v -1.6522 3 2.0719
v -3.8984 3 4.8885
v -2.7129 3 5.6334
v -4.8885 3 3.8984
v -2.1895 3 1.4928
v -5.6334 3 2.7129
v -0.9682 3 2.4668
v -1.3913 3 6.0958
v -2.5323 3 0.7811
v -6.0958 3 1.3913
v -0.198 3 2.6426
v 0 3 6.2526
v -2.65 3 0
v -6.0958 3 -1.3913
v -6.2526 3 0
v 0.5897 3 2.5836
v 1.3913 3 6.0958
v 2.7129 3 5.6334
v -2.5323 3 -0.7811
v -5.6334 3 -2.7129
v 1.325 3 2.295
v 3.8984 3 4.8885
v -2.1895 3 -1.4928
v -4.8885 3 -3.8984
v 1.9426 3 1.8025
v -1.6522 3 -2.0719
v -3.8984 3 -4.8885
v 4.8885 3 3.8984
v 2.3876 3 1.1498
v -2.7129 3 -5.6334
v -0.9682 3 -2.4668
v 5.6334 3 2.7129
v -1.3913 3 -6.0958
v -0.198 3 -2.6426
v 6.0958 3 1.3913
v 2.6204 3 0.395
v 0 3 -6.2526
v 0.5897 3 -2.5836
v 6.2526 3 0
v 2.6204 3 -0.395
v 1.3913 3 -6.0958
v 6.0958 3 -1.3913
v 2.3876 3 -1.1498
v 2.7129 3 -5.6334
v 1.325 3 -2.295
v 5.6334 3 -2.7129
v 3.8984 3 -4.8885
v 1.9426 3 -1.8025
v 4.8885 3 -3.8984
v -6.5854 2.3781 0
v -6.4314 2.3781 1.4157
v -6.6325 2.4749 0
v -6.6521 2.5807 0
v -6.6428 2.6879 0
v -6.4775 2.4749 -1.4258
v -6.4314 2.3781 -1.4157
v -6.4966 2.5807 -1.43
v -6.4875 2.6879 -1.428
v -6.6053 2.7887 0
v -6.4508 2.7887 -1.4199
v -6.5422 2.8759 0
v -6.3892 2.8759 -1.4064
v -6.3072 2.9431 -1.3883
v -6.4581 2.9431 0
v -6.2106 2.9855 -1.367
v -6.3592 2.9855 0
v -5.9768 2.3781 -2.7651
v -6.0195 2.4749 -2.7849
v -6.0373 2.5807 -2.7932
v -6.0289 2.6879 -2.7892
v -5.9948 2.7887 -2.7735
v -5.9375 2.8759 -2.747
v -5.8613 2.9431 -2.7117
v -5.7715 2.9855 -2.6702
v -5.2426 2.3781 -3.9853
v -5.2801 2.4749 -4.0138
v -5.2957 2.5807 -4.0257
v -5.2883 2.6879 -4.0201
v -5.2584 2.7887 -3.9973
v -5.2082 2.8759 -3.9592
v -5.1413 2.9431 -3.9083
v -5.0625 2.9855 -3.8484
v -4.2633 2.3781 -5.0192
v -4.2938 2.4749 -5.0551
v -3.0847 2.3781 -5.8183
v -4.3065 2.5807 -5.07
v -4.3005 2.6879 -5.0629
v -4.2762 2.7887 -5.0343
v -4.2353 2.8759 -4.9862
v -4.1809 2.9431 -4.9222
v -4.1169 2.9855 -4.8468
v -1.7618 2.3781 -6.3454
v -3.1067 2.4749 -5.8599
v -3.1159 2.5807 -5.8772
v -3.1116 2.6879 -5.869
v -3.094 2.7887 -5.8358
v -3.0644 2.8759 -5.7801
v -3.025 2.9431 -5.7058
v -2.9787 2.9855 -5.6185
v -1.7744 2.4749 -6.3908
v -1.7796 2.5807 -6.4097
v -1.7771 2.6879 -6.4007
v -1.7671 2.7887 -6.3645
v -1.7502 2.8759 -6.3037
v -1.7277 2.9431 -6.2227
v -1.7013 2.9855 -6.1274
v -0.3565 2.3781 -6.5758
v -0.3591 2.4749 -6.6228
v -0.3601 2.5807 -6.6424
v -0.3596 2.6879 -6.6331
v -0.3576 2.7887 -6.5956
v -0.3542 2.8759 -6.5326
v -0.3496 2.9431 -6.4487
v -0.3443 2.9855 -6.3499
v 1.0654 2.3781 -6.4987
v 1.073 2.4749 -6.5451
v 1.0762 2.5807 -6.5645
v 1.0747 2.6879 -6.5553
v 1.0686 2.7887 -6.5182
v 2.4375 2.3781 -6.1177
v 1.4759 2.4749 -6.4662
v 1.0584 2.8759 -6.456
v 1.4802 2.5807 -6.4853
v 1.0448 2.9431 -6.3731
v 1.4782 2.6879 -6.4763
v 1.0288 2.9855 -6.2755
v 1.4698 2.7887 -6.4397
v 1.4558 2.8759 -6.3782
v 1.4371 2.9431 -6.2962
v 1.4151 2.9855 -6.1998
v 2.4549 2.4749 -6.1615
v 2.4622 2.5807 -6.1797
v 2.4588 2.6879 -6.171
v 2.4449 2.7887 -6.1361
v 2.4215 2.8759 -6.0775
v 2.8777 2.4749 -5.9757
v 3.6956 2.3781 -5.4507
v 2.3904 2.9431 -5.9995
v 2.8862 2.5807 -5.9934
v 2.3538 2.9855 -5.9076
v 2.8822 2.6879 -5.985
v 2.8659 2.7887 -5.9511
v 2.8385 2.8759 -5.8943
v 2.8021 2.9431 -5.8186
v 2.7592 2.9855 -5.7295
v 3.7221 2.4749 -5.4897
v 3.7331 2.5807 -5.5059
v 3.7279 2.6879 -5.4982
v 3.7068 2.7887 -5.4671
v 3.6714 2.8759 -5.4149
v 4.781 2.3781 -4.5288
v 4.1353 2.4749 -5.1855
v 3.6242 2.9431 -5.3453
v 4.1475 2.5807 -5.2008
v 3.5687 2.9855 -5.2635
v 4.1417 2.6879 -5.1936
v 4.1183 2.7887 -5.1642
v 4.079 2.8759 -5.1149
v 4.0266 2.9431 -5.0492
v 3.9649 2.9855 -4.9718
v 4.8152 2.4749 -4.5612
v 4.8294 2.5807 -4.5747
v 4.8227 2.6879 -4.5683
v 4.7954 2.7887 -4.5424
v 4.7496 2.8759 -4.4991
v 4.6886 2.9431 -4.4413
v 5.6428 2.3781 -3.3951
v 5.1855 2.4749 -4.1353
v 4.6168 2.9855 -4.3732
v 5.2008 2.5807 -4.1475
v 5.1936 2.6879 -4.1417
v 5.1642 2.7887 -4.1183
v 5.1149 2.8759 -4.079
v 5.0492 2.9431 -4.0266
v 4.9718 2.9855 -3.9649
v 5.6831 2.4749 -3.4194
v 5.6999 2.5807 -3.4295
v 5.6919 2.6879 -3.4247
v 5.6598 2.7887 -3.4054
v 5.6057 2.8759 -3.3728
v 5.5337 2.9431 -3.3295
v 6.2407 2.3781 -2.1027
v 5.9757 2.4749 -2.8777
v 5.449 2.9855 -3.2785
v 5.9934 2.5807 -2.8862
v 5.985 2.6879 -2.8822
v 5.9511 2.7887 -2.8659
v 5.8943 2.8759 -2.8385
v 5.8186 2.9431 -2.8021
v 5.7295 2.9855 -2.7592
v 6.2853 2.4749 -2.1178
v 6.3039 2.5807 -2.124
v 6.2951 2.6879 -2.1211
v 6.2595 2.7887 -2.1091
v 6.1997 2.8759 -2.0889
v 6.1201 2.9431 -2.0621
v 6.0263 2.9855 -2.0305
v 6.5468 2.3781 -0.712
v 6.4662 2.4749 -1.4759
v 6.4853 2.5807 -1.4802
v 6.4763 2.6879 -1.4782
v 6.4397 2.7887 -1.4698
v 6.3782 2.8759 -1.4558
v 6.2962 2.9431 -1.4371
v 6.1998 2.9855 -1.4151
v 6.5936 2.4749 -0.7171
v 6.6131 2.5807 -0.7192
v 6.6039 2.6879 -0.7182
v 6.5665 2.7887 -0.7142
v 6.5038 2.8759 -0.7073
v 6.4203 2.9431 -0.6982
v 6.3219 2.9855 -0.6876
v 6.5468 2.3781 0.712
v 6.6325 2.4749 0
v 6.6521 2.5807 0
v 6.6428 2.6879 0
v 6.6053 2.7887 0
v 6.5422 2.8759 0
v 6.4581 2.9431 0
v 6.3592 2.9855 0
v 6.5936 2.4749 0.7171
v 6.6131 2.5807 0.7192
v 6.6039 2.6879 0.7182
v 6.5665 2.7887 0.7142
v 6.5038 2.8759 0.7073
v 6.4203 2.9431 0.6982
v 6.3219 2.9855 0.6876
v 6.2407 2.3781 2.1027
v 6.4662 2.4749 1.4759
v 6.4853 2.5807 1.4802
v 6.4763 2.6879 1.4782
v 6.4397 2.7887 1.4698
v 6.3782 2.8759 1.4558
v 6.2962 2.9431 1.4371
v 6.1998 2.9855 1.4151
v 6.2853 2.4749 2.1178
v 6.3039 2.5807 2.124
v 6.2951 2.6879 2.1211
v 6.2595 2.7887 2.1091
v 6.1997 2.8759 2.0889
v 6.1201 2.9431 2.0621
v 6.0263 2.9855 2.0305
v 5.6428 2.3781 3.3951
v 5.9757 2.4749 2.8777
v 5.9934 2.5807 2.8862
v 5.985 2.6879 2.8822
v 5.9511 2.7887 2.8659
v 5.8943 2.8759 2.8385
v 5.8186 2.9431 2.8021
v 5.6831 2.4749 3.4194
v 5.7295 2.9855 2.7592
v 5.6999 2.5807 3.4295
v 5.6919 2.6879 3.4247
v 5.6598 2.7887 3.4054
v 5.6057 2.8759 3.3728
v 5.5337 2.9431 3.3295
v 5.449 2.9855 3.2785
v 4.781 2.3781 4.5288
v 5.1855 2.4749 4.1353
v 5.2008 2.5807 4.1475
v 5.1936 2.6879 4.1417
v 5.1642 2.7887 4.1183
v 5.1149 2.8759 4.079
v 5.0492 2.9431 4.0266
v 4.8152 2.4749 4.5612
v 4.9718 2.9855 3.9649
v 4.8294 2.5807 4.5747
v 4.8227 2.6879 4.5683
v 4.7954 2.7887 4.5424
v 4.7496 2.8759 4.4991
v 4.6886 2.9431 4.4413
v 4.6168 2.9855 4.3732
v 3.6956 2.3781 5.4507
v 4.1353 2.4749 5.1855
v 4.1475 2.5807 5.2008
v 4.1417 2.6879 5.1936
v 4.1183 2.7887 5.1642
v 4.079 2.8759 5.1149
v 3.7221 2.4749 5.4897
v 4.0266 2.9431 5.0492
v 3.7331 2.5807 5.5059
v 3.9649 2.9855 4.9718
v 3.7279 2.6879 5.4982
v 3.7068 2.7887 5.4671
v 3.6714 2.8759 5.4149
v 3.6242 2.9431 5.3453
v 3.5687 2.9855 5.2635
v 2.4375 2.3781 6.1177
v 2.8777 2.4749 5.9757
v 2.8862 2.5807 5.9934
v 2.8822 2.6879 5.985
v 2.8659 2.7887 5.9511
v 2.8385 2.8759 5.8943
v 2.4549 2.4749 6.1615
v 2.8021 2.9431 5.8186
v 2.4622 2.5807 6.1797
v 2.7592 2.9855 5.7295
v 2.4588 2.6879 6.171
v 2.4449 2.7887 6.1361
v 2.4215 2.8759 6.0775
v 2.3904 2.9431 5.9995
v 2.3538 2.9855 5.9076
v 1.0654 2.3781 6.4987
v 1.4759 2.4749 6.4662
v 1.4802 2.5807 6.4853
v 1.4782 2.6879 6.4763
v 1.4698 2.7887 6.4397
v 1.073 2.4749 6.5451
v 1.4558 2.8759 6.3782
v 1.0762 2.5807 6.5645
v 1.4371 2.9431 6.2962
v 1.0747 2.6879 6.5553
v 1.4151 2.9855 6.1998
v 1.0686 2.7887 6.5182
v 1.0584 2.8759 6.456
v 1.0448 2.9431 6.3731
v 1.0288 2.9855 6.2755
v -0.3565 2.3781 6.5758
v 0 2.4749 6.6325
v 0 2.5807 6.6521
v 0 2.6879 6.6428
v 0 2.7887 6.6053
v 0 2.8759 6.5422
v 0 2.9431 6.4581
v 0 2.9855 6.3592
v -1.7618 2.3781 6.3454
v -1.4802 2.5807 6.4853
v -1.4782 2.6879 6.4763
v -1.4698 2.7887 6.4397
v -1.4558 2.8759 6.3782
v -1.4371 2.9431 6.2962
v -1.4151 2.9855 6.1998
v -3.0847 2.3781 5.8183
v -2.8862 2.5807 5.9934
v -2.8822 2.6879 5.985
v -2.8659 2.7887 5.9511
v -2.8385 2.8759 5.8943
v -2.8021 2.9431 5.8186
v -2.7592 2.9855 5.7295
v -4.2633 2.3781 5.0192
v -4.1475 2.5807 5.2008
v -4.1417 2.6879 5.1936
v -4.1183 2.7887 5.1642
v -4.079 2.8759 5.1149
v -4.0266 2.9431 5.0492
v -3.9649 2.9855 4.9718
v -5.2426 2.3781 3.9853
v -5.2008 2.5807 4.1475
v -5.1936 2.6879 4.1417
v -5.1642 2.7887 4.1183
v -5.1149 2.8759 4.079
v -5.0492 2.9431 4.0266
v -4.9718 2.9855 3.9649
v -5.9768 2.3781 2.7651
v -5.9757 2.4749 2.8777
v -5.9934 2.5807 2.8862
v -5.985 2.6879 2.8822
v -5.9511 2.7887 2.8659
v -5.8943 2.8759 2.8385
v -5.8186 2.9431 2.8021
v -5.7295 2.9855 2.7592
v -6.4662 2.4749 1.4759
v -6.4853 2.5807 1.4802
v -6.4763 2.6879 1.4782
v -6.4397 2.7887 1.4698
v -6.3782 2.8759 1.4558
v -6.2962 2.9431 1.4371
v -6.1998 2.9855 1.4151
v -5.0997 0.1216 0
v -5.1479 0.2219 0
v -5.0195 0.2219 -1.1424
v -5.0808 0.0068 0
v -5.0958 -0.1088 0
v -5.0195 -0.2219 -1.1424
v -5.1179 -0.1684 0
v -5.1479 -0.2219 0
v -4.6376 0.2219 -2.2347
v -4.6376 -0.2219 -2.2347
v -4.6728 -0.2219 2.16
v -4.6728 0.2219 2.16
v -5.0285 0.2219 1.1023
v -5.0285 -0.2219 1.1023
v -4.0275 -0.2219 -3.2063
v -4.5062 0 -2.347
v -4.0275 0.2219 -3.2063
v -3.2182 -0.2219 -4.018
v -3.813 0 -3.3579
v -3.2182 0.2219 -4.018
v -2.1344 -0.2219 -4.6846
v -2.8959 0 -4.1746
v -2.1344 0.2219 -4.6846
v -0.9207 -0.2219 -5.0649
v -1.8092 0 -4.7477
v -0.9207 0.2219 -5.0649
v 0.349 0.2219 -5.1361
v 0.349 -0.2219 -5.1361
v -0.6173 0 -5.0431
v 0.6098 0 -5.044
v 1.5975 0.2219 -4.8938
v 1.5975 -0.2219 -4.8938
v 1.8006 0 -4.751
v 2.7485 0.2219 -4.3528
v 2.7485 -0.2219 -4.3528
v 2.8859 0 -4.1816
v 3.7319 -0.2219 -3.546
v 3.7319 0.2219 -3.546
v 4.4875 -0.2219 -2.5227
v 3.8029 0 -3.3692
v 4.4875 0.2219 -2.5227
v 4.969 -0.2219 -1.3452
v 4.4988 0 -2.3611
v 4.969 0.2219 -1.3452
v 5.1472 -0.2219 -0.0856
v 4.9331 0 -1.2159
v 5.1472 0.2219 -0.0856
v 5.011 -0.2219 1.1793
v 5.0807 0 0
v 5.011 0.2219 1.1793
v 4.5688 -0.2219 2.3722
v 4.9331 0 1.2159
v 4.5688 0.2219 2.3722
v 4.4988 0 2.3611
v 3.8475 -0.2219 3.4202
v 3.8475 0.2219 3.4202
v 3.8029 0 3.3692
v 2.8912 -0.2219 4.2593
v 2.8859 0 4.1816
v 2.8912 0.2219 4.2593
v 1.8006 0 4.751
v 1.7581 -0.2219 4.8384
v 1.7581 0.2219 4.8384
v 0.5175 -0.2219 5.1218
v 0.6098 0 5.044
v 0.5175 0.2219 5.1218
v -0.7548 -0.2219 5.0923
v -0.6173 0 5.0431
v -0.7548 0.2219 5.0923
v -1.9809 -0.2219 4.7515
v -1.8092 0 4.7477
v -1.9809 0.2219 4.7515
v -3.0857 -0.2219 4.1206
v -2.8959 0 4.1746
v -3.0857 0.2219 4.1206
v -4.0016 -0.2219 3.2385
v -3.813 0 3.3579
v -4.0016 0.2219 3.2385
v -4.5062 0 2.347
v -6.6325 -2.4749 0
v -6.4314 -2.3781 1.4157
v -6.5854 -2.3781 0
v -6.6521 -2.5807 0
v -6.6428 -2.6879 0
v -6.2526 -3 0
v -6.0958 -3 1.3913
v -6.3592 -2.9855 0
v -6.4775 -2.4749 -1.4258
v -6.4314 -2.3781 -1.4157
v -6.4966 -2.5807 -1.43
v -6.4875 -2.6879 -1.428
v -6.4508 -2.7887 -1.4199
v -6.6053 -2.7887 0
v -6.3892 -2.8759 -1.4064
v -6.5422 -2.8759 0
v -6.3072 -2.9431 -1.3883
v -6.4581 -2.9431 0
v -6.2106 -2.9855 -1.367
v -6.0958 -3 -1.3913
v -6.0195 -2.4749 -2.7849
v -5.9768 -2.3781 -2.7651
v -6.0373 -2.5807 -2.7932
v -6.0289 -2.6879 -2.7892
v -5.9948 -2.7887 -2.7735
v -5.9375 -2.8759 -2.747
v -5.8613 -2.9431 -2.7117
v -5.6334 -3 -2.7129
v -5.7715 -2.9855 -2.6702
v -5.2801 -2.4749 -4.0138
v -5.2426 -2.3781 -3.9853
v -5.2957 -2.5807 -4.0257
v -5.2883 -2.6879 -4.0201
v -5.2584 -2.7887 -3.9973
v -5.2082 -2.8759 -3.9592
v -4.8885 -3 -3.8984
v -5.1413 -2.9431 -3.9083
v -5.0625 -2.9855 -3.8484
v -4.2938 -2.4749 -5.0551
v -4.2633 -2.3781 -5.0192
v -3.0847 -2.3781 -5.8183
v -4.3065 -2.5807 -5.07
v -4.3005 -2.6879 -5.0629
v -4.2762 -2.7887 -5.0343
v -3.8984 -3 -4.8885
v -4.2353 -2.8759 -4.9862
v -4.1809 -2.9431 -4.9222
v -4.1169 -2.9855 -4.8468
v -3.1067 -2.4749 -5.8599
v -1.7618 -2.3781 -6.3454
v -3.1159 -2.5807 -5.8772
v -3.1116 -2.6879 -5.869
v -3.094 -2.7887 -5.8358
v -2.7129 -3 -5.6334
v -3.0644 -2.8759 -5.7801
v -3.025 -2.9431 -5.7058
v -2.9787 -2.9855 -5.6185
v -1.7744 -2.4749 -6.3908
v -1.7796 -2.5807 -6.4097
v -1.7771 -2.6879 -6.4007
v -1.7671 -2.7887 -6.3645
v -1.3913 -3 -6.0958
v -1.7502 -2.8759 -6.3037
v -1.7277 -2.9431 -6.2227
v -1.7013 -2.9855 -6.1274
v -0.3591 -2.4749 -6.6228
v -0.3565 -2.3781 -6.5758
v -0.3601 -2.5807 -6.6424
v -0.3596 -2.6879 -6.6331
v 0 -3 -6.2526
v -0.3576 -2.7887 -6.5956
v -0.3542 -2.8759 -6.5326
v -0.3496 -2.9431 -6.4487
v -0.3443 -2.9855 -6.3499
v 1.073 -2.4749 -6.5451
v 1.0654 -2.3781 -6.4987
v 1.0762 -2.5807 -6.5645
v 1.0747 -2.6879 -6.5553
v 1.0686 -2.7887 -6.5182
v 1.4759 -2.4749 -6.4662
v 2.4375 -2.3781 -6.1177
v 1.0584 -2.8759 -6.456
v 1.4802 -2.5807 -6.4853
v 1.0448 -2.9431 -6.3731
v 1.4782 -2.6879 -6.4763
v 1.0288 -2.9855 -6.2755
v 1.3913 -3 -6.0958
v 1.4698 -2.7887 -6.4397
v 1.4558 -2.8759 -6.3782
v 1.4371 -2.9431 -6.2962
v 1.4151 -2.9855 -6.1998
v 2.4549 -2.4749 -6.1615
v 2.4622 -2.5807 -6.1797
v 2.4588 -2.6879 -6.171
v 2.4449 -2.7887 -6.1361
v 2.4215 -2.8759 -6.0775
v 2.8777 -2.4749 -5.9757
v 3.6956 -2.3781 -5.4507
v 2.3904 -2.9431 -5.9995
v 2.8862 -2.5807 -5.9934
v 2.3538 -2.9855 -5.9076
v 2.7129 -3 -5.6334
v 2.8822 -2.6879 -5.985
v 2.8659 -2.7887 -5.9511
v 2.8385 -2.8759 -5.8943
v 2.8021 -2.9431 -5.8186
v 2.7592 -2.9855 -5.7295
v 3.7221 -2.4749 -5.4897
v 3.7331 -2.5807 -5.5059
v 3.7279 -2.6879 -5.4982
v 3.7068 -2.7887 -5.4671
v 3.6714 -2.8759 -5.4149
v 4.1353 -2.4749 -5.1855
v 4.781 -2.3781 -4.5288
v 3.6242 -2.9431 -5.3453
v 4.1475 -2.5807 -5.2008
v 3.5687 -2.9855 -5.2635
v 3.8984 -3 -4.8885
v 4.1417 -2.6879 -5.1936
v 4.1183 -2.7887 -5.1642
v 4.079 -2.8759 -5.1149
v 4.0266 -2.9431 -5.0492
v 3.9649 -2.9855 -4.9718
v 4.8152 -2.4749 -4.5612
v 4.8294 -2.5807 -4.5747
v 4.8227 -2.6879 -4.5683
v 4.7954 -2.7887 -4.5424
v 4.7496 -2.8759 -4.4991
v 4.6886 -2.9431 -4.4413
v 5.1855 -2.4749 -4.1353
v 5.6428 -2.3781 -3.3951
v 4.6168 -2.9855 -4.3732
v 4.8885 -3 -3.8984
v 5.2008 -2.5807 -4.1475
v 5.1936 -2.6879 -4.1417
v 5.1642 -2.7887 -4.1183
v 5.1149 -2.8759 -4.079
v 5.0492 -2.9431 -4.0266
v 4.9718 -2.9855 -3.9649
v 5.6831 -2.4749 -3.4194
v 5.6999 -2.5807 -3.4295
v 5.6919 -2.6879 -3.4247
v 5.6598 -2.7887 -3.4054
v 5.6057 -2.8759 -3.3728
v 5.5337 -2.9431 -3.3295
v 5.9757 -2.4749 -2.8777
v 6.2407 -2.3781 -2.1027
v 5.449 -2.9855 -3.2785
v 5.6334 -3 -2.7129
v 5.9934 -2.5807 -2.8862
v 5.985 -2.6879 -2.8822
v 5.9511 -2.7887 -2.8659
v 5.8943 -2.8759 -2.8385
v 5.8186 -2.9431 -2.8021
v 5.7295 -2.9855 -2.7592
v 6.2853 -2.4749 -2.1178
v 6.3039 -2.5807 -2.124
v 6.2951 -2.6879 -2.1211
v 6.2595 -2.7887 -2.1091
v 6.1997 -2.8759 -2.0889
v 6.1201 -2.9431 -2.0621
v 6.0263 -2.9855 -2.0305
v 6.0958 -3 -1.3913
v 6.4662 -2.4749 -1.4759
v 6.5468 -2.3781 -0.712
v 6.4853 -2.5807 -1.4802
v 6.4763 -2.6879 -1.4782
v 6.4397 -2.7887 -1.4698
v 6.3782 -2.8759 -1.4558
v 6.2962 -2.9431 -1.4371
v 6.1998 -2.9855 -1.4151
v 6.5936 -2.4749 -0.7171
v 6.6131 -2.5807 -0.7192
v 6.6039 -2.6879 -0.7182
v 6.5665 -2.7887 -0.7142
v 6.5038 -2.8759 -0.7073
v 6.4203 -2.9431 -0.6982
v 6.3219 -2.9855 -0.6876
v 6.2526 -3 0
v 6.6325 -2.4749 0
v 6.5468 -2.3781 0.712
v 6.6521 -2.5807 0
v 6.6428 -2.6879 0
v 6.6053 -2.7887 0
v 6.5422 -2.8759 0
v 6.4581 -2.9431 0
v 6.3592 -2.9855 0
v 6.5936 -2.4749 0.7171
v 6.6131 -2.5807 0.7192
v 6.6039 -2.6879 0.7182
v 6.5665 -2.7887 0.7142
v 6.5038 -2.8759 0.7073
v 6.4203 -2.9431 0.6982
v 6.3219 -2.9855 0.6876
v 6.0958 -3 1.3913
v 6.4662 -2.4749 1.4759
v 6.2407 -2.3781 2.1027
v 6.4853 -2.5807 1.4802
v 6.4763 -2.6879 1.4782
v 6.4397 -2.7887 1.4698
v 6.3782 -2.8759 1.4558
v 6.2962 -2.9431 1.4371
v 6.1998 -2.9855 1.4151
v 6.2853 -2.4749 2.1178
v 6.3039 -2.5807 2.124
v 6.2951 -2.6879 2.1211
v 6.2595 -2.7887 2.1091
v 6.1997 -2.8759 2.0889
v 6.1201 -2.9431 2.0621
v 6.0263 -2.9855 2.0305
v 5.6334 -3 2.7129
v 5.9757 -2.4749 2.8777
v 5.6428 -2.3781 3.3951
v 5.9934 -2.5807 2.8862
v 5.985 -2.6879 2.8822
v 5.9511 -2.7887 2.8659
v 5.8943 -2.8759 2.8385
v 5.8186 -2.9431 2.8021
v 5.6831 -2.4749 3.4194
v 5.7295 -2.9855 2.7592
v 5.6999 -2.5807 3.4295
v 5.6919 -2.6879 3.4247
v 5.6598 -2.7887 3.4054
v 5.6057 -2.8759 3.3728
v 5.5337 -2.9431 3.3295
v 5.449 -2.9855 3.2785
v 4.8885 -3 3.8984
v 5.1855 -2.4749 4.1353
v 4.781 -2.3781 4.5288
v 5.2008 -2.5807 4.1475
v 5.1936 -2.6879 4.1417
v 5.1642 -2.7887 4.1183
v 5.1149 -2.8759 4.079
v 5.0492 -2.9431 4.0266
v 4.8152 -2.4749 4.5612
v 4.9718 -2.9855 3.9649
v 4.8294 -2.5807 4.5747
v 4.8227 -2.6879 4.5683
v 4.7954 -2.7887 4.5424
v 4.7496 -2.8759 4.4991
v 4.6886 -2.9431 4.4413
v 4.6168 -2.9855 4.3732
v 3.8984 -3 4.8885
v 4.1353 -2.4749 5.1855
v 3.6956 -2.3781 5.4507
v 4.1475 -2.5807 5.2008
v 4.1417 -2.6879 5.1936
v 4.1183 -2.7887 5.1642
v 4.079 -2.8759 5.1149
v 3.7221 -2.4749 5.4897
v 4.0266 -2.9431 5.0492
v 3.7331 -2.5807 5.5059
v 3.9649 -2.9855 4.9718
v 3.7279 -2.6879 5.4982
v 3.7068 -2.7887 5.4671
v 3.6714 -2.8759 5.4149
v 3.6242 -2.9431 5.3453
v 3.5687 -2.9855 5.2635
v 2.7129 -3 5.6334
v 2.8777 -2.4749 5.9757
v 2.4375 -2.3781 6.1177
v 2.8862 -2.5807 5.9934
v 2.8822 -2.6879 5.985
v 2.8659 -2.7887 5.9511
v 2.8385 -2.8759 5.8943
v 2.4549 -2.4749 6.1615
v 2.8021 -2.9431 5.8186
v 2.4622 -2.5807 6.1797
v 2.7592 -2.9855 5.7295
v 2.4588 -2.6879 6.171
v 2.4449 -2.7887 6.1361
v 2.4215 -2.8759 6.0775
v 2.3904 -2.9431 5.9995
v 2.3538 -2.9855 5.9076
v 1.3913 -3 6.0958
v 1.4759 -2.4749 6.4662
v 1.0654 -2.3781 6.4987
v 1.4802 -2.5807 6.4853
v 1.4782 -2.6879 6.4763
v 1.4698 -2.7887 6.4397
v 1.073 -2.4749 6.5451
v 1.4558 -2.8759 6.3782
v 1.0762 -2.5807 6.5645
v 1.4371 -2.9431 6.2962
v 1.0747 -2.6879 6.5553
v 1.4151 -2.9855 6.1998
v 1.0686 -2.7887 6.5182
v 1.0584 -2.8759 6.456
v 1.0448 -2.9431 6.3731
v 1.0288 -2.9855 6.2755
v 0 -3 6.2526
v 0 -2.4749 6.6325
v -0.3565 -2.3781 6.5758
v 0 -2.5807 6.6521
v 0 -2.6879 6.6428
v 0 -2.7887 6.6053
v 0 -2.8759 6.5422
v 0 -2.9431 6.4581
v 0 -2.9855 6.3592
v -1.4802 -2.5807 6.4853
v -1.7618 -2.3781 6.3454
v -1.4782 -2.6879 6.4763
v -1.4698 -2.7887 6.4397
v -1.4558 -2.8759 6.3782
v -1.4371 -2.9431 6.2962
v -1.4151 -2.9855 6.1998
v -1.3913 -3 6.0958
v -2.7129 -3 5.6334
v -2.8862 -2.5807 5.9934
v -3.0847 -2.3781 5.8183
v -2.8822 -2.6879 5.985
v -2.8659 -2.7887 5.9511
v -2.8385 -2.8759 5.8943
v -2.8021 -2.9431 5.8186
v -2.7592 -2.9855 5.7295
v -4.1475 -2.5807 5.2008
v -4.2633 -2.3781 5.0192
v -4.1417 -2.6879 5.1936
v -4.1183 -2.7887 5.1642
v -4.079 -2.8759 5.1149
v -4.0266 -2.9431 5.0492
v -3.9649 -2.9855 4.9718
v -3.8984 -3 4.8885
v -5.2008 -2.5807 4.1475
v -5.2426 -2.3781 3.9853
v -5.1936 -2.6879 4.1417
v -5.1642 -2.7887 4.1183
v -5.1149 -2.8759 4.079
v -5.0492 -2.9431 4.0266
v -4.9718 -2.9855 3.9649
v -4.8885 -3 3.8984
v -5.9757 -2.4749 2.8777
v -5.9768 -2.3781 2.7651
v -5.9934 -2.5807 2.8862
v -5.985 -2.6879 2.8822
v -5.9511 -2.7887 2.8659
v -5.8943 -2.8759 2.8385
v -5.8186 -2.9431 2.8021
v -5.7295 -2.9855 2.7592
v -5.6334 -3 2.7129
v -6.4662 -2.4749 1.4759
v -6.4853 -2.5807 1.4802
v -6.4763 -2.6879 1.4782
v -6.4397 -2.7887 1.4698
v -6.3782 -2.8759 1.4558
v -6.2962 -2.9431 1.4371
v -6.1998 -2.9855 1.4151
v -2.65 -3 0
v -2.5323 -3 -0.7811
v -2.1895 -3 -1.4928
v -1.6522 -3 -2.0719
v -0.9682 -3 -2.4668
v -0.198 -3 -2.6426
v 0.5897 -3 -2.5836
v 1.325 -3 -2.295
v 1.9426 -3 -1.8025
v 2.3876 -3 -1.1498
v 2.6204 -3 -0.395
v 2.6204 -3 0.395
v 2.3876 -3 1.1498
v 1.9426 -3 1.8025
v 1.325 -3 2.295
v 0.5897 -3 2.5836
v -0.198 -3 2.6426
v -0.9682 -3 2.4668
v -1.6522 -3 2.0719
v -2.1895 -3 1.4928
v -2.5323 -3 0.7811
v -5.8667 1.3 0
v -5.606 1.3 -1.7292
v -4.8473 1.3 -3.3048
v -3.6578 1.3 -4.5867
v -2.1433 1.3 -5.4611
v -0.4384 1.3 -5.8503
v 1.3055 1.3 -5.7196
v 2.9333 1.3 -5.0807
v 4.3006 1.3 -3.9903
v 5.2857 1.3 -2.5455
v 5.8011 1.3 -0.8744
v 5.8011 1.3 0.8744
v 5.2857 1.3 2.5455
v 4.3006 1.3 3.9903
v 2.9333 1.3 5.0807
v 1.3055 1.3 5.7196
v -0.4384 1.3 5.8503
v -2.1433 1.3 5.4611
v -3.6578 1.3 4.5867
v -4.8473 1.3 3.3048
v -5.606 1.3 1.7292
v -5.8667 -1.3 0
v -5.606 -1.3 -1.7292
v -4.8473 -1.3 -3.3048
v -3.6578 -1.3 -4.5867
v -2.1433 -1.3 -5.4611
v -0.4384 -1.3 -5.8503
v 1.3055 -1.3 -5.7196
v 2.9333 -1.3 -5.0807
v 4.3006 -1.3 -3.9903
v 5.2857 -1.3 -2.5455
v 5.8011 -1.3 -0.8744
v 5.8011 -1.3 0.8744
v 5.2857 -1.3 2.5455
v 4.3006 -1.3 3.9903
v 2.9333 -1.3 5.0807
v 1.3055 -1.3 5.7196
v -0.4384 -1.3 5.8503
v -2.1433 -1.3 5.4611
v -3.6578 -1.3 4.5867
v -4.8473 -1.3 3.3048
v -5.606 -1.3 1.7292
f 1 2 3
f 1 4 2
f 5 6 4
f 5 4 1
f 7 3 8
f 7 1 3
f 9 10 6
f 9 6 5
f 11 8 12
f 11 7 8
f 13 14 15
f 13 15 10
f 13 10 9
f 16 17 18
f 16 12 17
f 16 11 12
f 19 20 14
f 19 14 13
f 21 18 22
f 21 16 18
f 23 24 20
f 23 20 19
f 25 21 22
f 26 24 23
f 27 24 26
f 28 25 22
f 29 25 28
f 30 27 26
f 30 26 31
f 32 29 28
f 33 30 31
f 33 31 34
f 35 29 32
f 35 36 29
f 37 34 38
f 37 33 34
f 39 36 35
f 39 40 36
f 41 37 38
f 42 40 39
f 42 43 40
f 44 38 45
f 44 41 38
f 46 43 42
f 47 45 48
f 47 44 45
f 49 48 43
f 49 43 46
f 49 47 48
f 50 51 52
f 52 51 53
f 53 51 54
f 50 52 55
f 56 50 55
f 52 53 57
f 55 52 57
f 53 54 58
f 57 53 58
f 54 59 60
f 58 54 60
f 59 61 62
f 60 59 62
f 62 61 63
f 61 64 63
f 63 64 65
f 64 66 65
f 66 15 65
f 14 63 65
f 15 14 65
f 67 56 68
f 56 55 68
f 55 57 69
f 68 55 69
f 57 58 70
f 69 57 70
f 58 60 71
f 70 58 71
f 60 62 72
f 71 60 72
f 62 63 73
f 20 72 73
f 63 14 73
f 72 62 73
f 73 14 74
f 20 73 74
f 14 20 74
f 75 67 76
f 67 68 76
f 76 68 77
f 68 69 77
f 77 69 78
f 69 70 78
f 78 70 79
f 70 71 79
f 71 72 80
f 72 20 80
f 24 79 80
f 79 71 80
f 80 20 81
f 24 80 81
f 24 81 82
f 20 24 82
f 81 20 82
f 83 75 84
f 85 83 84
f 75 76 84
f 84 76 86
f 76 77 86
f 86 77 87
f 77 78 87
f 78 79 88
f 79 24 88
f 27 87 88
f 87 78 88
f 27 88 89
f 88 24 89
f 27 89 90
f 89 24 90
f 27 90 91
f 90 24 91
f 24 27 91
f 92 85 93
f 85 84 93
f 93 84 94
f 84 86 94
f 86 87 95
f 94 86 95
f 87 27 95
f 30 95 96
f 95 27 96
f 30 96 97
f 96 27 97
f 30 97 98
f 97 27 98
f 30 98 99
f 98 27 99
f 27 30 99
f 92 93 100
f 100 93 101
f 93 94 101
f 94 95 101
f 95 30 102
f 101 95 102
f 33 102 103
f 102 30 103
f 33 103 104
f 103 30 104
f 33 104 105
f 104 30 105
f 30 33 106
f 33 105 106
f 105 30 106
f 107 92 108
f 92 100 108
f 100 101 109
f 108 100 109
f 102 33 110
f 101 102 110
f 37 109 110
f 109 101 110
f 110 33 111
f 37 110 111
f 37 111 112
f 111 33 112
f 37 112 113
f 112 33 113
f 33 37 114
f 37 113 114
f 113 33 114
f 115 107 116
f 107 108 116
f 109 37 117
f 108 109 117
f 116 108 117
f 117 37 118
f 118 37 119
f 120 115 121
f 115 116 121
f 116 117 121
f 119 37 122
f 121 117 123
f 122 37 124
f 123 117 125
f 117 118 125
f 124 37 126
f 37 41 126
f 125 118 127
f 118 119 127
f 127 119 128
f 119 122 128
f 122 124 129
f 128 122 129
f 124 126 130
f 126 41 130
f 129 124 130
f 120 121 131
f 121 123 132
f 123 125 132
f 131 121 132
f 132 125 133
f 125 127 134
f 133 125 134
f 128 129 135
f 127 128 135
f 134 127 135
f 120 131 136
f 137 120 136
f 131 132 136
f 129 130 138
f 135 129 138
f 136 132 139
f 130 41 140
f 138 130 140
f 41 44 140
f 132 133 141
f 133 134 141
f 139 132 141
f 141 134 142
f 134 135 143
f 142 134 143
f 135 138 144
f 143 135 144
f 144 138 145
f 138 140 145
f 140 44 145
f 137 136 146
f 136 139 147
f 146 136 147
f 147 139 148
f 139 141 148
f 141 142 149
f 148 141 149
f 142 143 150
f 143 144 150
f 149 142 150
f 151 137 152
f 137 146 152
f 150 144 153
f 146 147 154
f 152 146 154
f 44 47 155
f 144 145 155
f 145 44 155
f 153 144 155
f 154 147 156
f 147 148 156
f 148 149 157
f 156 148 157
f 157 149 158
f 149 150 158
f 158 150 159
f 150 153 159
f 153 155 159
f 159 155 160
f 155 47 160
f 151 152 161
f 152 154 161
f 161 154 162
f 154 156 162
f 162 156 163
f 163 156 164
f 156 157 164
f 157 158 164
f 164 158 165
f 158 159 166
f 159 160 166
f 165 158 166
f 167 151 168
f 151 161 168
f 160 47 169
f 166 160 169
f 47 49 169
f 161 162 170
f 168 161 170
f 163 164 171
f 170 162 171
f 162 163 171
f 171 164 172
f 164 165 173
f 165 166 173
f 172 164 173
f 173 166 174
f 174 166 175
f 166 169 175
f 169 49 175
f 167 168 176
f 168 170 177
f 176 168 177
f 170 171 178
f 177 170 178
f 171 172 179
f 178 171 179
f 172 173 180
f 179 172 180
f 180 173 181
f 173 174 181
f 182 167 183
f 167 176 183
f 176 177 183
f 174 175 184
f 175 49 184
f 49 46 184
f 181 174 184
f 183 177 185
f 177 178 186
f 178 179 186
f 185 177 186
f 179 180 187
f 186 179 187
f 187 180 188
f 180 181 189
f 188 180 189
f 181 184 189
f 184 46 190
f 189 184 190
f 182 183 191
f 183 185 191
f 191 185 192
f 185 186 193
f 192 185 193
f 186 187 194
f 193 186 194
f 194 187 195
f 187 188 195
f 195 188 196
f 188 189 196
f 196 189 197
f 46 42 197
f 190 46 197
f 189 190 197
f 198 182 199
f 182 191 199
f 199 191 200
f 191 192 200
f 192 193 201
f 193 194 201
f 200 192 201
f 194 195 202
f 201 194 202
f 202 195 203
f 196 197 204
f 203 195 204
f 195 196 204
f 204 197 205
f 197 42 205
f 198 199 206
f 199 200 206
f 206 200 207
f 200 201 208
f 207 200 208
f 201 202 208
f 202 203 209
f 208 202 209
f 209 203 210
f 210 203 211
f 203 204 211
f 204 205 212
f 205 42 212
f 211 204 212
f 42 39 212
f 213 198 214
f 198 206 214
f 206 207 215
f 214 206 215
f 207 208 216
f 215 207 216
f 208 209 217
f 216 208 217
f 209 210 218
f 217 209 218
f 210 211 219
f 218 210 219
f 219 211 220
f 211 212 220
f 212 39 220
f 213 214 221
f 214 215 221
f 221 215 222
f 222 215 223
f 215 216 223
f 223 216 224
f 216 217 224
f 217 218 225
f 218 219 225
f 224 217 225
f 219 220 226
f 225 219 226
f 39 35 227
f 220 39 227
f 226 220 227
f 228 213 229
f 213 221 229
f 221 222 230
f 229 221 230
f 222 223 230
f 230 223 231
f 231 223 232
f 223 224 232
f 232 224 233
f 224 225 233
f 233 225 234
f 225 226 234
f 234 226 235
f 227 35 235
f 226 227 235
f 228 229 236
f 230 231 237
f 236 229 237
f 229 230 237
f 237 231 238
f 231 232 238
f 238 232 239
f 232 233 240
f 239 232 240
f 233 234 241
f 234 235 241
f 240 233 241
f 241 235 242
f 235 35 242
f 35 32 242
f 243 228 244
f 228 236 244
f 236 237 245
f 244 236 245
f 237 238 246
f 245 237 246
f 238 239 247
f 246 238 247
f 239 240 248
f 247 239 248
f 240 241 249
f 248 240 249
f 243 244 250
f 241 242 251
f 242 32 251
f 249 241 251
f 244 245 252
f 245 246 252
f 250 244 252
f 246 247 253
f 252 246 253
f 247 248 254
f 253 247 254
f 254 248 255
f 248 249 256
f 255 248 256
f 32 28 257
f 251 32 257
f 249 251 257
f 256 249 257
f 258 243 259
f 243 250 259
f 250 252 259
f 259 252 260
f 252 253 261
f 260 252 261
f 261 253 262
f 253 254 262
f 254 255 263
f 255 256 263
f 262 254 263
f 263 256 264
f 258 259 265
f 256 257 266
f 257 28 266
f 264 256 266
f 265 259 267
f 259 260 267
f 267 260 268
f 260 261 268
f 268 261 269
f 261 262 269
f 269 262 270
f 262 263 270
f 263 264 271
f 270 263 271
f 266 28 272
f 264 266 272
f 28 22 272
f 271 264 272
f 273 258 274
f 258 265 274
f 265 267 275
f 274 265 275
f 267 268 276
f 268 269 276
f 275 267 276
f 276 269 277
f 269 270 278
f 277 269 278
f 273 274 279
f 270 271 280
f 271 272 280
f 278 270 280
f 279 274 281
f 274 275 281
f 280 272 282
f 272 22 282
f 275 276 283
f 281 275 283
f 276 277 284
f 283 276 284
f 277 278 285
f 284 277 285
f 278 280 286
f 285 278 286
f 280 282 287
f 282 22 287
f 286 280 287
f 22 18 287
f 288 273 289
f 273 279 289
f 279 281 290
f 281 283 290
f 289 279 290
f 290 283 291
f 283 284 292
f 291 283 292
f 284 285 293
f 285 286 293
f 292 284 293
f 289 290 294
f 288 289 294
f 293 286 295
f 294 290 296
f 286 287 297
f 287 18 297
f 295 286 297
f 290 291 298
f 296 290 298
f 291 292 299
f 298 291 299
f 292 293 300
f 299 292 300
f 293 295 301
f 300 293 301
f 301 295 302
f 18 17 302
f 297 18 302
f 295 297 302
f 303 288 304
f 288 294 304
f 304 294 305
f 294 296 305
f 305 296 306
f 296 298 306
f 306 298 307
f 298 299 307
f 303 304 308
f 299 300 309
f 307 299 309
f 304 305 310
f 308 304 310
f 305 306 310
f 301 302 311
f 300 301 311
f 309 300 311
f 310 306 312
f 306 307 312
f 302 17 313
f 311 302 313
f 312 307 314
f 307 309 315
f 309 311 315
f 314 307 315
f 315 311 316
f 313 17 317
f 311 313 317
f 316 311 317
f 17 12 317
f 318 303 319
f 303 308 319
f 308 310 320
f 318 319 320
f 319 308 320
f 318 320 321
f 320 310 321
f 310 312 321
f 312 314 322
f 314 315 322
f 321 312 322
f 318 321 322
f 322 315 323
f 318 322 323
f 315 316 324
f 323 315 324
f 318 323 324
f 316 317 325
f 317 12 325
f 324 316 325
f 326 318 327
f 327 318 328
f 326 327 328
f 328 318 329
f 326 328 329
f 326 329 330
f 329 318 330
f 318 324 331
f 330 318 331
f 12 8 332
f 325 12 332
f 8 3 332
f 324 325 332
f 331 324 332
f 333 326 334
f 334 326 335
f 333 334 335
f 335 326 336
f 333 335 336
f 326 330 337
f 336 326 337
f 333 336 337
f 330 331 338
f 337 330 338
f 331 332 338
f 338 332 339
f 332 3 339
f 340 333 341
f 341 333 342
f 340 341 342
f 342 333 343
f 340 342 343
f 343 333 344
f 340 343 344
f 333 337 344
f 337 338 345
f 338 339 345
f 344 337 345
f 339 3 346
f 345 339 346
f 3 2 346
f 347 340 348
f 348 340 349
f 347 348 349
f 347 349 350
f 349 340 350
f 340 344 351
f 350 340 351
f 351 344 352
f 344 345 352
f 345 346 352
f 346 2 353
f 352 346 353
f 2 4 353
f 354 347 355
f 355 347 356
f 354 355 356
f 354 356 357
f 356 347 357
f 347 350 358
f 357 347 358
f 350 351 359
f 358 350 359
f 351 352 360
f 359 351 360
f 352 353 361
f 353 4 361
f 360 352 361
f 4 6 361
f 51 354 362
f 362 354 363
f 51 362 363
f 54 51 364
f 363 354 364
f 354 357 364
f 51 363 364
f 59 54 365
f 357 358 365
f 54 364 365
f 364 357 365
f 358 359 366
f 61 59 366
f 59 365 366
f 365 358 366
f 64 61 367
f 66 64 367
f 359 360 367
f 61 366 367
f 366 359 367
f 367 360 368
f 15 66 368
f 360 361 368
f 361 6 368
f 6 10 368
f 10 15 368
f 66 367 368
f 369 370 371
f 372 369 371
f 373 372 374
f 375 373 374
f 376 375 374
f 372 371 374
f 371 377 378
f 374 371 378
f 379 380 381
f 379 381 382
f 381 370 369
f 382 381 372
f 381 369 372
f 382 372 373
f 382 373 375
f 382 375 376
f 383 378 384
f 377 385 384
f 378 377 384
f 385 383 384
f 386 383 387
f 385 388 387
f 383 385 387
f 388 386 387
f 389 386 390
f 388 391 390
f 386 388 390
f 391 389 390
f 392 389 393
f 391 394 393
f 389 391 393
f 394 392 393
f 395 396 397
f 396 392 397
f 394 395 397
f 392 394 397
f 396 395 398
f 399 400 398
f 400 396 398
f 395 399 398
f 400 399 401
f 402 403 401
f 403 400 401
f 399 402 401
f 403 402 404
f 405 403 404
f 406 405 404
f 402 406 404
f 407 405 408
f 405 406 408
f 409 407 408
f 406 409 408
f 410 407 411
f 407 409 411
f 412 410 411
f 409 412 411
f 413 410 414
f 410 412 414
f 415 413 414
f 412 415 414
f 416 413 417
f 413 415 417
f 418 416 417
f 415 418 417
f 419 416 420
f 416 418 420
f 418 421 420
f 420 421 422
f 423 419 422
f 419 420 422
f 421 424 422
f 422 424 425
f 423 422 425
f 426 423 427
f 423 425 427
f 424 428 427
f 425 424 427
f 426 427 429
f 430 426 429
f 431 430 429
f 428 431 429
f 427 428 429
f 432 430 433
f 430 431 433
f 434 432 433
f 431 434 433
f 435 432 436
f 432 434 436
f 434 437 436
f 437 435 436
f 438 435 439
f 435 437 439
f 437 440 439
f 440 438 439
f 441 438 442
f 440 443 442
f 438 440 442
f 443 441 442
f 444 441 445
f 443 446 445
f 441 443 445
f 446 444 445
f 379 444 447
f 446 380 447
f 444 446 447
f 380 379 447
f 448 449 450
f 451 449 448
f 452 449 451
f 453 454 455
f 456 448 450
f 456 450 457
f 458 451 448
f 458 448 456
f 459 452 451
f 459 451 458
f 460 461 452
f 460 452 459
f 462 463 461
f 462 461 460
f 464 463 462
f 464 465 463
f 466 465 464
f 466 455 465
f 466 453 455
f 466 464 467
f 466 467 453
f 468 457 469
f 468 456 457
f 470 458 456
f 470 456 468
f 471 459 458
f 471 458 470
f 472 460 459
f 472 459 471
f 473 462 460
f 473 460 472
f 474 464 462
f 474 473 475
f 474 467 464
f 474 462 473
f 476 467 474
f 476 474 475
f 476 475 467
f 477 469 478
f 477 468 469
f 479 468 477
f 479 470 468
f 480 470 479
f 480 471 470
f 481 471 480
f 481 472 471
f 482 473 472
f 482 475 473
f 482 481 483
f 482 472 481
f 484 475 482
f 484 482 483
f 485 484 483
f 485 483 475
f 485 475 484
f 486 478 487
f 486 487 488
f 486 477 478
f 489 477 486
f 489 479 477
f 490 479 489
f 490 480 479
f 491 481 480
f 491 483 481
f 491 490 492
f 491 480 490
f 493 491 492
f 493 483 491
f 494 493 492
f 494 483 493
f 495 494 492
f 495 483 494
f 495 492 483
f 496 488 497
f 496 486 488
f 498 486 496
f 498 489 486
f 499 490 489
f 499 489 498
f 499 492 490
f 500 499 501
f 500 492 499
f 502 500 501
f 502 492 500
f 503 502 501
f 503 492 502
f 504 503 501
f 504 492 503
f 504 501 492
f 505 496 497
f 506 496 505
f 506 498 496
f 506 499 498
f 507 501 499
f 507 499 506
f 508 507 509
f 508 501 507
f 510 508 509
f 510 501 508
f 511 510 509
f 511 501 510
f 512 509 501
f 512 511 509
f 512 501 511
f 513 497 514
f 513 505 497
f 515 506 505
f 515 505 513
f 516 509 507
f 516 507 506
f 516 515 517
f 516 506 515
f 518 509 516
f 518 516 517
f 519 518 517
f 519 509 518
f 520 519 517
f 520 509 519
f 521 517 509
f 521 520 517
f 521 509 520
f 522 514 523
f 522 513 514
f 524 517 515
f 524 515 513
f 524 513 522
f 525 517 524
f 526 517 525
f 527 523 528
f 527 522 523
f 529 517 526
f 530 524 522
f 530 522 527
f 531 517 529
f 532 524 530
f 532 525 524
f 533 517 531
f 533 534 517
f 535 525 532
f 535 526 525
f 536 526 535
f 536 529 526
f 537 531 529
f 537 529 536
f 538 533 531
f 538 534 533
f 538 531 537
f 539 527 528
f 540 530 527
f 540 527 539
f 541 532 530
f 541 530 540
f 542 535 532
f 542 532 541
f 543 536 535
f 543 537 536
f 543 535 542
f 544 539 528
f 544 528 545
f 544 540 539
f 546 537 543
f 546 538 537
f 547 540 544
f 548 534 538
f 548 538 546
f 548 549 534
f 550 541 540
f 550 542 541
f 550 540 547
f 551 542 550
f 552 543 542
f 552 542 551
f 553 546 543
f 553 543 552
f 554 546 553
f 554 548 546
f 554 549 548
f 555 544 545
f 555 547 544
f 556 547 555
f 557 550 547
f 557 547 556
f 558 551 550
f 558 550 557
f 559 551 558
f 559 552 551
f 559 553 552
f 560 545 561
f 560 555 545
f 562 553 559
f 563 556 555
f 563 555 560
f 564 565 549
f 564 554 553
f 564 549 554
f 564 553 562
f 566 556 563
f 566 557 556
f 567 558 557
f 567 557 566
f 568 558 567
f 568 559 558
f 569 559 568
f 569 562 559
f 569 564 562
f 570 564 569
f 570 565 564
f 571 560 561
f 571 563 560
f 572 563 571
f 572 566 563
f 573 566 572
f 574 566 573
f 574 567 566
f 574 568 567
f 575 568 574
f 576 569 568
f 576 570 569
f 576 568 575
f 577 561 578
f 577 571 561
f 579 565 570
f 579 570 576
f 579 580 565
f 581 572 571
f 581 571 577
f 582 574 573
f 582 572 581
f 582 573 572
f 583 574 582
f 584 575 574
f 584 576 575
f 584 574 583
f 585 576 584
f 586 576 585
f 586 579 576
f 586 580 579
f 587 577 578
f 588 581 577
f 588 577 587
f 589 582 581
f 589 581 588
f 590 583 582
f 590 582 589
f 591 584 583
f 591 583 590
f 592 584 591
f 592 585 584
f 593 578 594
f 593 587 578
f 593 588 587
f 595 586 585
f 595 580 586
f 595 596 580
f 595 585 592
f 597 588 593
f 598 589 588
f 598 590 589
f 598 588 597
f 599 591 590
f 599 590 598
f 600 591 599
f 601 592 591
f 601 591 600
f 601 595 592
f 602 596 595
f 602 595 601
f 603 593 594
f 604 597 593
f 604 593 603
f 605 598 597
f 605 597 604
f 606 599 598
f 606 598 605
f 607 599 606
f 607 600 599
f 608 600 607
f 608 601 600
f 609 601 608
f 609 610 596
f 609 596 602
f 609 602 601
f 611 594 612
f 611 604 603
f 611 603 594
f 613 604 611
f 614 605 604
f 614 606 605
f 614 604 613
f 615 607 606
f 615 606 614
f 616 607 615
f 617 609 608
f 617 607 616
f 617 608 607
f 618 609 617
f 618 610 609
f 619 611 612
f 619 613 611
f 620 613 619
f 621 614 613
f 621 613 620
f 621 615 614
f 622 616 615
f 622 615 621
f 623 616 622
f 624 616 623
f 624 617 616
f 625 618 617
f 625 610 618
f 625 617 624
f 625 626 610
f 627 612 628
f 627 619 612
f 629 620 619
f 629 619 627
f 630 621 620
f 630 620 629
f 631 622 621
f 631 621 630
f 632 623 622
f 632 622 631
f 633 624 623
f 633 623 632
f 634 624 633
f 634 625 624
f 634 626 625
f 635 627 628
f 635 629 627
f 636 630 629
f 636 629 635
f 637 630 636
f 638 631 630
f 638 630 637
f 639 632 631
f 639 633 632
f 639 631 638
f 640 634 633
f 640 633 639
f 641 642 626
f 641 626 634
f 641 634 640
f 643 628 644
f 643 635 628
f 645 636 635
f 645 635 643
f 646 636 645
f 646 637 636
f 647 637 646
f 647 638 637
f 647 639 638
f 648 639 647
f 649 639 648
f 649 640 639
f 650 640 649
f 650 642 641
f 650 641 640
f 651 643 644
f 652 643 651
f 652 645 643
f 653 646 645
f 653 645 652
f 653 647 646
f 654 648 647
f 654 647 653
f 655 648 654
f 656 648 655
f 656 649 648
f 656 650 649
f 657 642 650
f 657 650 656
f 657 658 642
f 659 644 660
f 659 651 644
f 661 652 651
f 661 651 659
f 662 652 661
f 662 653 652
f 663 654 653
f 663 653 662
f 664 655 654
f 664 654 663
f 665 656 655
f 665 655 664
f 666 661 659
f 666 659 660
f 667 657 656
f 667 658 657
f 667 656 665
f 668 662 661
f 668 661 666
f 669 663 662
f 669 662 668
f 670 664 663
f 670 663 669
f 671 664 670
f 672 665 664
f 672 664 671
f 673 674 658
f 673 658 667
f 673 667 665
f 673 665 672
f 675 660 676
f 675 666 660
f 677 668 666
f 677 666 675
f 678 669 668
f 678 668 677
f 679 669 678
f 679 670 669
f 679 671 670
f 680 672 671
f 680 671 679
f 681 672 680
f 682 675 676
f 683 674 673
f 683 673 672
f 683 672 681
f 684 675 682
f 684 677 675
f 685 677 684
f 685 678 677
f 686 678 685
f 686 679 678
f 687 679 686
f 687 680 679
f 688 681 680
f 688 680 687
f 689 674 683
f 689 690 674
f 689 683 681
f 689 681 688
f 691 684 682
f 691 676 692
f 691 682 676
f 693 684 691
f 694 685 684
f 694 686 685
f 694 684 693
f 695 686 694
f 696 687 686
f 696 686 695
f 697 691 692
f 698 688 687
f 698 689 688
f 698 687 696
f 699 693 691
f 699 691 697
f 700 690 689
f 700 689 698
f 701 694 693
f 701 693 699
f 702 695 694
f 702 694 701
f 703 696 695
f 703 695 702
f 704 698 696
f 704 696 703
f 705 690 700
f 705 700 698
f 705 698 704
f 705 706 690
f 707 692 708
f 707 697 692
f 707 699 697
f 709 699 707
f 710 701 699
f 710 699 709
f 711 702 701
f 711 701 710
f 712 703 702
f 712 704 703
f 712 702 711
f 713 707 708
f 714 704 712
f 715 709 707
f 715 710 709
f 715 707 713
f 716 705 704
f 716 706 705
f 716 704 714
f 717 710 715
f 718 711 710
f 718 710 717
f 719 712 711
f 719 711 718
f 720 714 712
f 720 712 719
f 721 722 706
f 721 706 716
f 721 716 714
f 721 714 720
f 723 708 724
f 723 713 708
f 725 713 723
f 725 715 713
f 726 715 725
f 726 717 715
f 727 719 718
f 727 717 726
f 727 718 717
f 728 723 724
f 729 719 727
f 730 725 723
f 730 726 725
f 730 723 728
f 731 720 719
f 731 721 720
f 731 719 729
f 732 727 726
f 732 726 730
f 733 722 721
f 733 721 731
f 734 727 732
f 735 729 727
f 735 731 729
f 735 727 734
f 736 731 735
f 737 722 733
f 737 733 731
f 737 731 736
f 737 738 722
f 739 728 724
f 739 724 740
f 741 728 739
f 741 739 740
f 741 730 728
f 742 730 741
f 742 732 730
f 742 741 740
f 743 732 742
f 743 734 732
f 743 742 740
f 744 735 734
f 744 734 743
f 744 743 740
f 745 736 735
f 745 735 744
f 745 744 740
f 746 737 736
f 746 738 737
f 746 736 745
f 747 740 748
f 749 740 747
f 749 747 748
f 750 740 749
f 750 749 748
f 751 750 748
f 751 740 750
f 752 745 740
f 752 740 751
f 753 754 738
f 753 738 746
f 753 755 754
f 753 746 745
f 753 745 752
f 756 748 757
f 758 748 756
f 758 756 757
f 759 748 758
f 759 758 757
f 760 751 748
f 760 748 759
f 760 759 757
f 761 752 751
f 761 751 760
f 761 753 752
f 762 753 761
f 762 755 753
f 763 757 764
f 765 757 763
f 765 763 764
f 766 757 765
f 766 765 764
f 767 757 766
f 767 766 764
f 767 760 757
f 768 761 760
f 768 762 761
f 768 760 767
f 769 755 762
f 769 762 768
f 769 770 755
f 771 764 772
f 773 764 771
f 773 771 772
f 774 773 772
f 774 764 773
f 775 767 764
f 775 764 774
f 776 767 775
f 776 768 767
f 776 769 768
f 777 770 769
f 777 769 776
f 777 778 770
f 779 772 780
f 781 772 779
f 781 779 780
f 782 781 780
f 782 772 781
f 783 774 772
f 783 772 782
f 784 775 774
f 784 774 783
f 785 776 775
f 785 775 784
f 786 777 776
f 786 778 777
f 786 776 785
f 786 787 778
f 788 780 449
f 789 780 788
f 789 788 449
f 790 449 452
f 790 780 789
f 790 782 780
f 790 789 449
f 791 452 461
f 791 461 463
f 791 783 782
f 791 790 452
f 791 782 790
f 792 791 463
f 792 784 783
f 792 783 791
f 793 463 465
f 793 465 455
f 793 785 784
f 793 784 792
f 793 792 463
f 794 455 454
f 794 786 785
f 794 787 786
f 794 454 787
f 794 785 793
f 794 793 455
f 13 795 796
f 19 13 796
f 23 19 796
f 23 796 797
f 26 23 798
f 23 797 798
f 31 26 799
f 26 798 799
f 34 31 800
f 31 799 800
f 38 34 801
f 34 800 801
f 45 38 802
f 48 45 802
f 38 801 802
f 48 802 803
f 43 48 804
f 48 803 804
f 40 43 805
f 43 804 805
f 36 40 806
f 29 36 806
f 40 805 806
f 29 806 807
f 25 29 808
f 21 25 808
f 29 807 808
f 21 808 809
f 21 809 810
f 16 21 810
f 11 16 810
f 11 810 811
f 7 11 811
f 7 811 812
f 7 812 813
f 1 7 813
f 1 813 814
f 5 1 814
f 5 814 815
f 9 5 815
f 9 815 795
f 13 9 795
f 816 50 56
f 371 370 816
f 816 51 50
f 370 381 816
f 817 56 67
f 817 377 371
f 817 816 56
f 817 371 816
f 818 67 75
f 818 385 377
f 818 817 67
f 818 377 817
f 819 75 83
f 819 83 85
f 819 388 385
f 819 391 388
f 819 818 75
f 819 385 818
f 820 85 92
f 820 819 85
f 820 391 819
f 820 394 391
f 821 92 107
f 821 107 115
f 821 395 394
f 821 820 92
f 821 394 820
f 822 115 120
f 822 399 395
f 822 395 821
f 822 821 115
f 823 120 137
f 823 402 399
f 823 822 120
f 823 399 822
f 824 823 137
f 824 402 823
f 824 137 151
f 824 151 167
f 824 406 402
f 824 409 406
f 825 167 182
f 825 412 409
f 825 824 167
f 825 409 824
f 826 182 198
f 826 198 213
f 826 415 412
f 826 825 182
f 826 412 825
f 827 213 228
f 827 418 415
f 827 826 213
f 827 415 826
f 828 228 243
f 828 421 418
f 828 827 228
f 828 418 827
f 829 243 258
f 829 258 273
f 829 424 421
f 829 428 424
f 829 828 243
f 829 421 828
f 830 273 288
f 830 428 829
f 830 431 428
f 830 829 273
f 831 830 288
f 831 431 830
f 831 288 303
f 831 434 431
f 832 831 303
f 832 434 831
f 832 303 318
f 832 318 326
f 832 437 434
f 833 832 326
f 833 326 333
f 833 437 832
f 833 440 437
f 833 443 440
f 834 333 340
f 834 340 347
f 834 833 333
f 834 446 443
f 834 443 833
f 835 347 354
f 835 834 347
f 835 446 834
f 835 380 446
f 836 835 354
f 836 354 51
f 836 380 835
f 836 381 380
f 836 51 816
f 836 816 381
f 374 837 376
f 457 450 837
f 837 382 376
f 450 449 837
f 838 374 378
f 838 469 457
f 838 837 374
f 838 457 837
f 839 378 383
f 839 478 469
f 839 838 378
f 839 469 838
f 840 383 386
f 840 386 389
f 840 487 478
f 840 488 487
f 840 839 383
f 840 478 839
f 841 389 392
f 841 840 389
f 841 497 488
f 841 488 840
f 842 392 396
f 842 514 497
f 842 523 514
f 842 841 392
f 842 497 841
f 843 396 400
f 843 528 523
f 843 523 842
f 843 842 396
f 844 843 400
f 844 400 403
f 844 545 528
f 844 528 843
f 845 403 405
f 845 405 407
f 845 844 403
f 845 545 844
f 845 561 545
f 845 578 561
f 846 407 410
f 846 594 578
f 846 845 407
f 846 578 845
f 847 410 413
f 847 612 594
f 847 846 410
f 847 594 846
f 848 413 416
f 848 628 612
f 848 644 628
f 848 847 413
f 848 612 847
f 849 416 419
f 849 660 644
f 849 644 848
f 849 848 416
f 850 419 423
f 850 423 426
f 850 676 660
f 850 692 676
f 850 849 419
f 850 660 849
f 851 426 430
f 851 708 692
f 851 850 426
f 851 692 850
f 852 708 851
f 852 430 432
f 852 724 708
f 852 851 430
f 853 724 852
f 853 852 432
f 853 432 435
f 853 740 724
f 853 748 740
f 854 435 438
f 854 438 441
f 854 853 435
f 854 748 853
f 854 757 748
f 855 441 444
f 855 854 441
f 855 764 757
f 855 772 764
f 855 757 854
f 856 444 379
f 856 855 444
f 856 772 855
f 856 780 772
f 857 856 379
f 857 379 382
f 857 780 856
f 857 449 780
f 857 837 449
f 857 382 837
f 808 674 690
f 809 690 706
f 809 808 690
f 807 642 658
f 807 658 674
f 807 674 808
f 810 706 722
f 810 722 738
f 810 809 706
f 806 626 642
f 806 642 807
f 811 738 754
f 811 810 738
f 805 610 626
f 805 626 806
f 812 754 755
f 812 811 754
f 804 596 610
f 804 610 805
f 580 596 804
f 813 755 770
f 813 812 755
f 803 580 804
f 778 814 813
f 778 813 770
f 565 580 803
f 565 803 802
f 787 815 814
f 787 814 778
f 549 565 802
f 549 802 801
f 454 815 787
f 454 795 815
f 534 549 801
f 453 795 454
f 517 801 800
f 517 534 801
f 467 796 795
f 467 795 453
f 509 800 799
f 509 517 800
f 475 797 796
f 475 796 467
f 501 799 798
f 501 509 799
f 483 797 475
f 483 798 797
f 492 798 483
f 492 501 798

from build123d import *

# Parameters (mm, degrees)
CONG_1_R         = 0.4
D_GAGEMENT_M51_D = 5.3


with BuildPart() as part:
    # Esquisse2 → Révolution1 (revolve)
    with BuildSketch(Plane.XY):
        Polygon((-7, 3), (-5, 0), (-7, -3), (0, -3), (0, 3), align=None)
    revolve(axis=Axis((0, 3, 0), (0, -1, 0)))

    # Congé1
    cong_1_edges = [part.edges().sort_by_distance(p)[0] for p in [
        (7, 3, 0),
        (5, 0, 0),
        (7, -3, 0),
    ]]
    fillet(cong_1_edges, radius=CONG_1_R)

    # Dégagement M51 (through all)
    with Locations(Plane(origin=(0, 3, 0), x_dir=(1, 0, 0), z_dir=(0, 1, 0))):
        with Locations((0, 0)):
            Hole(D_GAGEMENT_M51_D / 2)


solid = part.part
